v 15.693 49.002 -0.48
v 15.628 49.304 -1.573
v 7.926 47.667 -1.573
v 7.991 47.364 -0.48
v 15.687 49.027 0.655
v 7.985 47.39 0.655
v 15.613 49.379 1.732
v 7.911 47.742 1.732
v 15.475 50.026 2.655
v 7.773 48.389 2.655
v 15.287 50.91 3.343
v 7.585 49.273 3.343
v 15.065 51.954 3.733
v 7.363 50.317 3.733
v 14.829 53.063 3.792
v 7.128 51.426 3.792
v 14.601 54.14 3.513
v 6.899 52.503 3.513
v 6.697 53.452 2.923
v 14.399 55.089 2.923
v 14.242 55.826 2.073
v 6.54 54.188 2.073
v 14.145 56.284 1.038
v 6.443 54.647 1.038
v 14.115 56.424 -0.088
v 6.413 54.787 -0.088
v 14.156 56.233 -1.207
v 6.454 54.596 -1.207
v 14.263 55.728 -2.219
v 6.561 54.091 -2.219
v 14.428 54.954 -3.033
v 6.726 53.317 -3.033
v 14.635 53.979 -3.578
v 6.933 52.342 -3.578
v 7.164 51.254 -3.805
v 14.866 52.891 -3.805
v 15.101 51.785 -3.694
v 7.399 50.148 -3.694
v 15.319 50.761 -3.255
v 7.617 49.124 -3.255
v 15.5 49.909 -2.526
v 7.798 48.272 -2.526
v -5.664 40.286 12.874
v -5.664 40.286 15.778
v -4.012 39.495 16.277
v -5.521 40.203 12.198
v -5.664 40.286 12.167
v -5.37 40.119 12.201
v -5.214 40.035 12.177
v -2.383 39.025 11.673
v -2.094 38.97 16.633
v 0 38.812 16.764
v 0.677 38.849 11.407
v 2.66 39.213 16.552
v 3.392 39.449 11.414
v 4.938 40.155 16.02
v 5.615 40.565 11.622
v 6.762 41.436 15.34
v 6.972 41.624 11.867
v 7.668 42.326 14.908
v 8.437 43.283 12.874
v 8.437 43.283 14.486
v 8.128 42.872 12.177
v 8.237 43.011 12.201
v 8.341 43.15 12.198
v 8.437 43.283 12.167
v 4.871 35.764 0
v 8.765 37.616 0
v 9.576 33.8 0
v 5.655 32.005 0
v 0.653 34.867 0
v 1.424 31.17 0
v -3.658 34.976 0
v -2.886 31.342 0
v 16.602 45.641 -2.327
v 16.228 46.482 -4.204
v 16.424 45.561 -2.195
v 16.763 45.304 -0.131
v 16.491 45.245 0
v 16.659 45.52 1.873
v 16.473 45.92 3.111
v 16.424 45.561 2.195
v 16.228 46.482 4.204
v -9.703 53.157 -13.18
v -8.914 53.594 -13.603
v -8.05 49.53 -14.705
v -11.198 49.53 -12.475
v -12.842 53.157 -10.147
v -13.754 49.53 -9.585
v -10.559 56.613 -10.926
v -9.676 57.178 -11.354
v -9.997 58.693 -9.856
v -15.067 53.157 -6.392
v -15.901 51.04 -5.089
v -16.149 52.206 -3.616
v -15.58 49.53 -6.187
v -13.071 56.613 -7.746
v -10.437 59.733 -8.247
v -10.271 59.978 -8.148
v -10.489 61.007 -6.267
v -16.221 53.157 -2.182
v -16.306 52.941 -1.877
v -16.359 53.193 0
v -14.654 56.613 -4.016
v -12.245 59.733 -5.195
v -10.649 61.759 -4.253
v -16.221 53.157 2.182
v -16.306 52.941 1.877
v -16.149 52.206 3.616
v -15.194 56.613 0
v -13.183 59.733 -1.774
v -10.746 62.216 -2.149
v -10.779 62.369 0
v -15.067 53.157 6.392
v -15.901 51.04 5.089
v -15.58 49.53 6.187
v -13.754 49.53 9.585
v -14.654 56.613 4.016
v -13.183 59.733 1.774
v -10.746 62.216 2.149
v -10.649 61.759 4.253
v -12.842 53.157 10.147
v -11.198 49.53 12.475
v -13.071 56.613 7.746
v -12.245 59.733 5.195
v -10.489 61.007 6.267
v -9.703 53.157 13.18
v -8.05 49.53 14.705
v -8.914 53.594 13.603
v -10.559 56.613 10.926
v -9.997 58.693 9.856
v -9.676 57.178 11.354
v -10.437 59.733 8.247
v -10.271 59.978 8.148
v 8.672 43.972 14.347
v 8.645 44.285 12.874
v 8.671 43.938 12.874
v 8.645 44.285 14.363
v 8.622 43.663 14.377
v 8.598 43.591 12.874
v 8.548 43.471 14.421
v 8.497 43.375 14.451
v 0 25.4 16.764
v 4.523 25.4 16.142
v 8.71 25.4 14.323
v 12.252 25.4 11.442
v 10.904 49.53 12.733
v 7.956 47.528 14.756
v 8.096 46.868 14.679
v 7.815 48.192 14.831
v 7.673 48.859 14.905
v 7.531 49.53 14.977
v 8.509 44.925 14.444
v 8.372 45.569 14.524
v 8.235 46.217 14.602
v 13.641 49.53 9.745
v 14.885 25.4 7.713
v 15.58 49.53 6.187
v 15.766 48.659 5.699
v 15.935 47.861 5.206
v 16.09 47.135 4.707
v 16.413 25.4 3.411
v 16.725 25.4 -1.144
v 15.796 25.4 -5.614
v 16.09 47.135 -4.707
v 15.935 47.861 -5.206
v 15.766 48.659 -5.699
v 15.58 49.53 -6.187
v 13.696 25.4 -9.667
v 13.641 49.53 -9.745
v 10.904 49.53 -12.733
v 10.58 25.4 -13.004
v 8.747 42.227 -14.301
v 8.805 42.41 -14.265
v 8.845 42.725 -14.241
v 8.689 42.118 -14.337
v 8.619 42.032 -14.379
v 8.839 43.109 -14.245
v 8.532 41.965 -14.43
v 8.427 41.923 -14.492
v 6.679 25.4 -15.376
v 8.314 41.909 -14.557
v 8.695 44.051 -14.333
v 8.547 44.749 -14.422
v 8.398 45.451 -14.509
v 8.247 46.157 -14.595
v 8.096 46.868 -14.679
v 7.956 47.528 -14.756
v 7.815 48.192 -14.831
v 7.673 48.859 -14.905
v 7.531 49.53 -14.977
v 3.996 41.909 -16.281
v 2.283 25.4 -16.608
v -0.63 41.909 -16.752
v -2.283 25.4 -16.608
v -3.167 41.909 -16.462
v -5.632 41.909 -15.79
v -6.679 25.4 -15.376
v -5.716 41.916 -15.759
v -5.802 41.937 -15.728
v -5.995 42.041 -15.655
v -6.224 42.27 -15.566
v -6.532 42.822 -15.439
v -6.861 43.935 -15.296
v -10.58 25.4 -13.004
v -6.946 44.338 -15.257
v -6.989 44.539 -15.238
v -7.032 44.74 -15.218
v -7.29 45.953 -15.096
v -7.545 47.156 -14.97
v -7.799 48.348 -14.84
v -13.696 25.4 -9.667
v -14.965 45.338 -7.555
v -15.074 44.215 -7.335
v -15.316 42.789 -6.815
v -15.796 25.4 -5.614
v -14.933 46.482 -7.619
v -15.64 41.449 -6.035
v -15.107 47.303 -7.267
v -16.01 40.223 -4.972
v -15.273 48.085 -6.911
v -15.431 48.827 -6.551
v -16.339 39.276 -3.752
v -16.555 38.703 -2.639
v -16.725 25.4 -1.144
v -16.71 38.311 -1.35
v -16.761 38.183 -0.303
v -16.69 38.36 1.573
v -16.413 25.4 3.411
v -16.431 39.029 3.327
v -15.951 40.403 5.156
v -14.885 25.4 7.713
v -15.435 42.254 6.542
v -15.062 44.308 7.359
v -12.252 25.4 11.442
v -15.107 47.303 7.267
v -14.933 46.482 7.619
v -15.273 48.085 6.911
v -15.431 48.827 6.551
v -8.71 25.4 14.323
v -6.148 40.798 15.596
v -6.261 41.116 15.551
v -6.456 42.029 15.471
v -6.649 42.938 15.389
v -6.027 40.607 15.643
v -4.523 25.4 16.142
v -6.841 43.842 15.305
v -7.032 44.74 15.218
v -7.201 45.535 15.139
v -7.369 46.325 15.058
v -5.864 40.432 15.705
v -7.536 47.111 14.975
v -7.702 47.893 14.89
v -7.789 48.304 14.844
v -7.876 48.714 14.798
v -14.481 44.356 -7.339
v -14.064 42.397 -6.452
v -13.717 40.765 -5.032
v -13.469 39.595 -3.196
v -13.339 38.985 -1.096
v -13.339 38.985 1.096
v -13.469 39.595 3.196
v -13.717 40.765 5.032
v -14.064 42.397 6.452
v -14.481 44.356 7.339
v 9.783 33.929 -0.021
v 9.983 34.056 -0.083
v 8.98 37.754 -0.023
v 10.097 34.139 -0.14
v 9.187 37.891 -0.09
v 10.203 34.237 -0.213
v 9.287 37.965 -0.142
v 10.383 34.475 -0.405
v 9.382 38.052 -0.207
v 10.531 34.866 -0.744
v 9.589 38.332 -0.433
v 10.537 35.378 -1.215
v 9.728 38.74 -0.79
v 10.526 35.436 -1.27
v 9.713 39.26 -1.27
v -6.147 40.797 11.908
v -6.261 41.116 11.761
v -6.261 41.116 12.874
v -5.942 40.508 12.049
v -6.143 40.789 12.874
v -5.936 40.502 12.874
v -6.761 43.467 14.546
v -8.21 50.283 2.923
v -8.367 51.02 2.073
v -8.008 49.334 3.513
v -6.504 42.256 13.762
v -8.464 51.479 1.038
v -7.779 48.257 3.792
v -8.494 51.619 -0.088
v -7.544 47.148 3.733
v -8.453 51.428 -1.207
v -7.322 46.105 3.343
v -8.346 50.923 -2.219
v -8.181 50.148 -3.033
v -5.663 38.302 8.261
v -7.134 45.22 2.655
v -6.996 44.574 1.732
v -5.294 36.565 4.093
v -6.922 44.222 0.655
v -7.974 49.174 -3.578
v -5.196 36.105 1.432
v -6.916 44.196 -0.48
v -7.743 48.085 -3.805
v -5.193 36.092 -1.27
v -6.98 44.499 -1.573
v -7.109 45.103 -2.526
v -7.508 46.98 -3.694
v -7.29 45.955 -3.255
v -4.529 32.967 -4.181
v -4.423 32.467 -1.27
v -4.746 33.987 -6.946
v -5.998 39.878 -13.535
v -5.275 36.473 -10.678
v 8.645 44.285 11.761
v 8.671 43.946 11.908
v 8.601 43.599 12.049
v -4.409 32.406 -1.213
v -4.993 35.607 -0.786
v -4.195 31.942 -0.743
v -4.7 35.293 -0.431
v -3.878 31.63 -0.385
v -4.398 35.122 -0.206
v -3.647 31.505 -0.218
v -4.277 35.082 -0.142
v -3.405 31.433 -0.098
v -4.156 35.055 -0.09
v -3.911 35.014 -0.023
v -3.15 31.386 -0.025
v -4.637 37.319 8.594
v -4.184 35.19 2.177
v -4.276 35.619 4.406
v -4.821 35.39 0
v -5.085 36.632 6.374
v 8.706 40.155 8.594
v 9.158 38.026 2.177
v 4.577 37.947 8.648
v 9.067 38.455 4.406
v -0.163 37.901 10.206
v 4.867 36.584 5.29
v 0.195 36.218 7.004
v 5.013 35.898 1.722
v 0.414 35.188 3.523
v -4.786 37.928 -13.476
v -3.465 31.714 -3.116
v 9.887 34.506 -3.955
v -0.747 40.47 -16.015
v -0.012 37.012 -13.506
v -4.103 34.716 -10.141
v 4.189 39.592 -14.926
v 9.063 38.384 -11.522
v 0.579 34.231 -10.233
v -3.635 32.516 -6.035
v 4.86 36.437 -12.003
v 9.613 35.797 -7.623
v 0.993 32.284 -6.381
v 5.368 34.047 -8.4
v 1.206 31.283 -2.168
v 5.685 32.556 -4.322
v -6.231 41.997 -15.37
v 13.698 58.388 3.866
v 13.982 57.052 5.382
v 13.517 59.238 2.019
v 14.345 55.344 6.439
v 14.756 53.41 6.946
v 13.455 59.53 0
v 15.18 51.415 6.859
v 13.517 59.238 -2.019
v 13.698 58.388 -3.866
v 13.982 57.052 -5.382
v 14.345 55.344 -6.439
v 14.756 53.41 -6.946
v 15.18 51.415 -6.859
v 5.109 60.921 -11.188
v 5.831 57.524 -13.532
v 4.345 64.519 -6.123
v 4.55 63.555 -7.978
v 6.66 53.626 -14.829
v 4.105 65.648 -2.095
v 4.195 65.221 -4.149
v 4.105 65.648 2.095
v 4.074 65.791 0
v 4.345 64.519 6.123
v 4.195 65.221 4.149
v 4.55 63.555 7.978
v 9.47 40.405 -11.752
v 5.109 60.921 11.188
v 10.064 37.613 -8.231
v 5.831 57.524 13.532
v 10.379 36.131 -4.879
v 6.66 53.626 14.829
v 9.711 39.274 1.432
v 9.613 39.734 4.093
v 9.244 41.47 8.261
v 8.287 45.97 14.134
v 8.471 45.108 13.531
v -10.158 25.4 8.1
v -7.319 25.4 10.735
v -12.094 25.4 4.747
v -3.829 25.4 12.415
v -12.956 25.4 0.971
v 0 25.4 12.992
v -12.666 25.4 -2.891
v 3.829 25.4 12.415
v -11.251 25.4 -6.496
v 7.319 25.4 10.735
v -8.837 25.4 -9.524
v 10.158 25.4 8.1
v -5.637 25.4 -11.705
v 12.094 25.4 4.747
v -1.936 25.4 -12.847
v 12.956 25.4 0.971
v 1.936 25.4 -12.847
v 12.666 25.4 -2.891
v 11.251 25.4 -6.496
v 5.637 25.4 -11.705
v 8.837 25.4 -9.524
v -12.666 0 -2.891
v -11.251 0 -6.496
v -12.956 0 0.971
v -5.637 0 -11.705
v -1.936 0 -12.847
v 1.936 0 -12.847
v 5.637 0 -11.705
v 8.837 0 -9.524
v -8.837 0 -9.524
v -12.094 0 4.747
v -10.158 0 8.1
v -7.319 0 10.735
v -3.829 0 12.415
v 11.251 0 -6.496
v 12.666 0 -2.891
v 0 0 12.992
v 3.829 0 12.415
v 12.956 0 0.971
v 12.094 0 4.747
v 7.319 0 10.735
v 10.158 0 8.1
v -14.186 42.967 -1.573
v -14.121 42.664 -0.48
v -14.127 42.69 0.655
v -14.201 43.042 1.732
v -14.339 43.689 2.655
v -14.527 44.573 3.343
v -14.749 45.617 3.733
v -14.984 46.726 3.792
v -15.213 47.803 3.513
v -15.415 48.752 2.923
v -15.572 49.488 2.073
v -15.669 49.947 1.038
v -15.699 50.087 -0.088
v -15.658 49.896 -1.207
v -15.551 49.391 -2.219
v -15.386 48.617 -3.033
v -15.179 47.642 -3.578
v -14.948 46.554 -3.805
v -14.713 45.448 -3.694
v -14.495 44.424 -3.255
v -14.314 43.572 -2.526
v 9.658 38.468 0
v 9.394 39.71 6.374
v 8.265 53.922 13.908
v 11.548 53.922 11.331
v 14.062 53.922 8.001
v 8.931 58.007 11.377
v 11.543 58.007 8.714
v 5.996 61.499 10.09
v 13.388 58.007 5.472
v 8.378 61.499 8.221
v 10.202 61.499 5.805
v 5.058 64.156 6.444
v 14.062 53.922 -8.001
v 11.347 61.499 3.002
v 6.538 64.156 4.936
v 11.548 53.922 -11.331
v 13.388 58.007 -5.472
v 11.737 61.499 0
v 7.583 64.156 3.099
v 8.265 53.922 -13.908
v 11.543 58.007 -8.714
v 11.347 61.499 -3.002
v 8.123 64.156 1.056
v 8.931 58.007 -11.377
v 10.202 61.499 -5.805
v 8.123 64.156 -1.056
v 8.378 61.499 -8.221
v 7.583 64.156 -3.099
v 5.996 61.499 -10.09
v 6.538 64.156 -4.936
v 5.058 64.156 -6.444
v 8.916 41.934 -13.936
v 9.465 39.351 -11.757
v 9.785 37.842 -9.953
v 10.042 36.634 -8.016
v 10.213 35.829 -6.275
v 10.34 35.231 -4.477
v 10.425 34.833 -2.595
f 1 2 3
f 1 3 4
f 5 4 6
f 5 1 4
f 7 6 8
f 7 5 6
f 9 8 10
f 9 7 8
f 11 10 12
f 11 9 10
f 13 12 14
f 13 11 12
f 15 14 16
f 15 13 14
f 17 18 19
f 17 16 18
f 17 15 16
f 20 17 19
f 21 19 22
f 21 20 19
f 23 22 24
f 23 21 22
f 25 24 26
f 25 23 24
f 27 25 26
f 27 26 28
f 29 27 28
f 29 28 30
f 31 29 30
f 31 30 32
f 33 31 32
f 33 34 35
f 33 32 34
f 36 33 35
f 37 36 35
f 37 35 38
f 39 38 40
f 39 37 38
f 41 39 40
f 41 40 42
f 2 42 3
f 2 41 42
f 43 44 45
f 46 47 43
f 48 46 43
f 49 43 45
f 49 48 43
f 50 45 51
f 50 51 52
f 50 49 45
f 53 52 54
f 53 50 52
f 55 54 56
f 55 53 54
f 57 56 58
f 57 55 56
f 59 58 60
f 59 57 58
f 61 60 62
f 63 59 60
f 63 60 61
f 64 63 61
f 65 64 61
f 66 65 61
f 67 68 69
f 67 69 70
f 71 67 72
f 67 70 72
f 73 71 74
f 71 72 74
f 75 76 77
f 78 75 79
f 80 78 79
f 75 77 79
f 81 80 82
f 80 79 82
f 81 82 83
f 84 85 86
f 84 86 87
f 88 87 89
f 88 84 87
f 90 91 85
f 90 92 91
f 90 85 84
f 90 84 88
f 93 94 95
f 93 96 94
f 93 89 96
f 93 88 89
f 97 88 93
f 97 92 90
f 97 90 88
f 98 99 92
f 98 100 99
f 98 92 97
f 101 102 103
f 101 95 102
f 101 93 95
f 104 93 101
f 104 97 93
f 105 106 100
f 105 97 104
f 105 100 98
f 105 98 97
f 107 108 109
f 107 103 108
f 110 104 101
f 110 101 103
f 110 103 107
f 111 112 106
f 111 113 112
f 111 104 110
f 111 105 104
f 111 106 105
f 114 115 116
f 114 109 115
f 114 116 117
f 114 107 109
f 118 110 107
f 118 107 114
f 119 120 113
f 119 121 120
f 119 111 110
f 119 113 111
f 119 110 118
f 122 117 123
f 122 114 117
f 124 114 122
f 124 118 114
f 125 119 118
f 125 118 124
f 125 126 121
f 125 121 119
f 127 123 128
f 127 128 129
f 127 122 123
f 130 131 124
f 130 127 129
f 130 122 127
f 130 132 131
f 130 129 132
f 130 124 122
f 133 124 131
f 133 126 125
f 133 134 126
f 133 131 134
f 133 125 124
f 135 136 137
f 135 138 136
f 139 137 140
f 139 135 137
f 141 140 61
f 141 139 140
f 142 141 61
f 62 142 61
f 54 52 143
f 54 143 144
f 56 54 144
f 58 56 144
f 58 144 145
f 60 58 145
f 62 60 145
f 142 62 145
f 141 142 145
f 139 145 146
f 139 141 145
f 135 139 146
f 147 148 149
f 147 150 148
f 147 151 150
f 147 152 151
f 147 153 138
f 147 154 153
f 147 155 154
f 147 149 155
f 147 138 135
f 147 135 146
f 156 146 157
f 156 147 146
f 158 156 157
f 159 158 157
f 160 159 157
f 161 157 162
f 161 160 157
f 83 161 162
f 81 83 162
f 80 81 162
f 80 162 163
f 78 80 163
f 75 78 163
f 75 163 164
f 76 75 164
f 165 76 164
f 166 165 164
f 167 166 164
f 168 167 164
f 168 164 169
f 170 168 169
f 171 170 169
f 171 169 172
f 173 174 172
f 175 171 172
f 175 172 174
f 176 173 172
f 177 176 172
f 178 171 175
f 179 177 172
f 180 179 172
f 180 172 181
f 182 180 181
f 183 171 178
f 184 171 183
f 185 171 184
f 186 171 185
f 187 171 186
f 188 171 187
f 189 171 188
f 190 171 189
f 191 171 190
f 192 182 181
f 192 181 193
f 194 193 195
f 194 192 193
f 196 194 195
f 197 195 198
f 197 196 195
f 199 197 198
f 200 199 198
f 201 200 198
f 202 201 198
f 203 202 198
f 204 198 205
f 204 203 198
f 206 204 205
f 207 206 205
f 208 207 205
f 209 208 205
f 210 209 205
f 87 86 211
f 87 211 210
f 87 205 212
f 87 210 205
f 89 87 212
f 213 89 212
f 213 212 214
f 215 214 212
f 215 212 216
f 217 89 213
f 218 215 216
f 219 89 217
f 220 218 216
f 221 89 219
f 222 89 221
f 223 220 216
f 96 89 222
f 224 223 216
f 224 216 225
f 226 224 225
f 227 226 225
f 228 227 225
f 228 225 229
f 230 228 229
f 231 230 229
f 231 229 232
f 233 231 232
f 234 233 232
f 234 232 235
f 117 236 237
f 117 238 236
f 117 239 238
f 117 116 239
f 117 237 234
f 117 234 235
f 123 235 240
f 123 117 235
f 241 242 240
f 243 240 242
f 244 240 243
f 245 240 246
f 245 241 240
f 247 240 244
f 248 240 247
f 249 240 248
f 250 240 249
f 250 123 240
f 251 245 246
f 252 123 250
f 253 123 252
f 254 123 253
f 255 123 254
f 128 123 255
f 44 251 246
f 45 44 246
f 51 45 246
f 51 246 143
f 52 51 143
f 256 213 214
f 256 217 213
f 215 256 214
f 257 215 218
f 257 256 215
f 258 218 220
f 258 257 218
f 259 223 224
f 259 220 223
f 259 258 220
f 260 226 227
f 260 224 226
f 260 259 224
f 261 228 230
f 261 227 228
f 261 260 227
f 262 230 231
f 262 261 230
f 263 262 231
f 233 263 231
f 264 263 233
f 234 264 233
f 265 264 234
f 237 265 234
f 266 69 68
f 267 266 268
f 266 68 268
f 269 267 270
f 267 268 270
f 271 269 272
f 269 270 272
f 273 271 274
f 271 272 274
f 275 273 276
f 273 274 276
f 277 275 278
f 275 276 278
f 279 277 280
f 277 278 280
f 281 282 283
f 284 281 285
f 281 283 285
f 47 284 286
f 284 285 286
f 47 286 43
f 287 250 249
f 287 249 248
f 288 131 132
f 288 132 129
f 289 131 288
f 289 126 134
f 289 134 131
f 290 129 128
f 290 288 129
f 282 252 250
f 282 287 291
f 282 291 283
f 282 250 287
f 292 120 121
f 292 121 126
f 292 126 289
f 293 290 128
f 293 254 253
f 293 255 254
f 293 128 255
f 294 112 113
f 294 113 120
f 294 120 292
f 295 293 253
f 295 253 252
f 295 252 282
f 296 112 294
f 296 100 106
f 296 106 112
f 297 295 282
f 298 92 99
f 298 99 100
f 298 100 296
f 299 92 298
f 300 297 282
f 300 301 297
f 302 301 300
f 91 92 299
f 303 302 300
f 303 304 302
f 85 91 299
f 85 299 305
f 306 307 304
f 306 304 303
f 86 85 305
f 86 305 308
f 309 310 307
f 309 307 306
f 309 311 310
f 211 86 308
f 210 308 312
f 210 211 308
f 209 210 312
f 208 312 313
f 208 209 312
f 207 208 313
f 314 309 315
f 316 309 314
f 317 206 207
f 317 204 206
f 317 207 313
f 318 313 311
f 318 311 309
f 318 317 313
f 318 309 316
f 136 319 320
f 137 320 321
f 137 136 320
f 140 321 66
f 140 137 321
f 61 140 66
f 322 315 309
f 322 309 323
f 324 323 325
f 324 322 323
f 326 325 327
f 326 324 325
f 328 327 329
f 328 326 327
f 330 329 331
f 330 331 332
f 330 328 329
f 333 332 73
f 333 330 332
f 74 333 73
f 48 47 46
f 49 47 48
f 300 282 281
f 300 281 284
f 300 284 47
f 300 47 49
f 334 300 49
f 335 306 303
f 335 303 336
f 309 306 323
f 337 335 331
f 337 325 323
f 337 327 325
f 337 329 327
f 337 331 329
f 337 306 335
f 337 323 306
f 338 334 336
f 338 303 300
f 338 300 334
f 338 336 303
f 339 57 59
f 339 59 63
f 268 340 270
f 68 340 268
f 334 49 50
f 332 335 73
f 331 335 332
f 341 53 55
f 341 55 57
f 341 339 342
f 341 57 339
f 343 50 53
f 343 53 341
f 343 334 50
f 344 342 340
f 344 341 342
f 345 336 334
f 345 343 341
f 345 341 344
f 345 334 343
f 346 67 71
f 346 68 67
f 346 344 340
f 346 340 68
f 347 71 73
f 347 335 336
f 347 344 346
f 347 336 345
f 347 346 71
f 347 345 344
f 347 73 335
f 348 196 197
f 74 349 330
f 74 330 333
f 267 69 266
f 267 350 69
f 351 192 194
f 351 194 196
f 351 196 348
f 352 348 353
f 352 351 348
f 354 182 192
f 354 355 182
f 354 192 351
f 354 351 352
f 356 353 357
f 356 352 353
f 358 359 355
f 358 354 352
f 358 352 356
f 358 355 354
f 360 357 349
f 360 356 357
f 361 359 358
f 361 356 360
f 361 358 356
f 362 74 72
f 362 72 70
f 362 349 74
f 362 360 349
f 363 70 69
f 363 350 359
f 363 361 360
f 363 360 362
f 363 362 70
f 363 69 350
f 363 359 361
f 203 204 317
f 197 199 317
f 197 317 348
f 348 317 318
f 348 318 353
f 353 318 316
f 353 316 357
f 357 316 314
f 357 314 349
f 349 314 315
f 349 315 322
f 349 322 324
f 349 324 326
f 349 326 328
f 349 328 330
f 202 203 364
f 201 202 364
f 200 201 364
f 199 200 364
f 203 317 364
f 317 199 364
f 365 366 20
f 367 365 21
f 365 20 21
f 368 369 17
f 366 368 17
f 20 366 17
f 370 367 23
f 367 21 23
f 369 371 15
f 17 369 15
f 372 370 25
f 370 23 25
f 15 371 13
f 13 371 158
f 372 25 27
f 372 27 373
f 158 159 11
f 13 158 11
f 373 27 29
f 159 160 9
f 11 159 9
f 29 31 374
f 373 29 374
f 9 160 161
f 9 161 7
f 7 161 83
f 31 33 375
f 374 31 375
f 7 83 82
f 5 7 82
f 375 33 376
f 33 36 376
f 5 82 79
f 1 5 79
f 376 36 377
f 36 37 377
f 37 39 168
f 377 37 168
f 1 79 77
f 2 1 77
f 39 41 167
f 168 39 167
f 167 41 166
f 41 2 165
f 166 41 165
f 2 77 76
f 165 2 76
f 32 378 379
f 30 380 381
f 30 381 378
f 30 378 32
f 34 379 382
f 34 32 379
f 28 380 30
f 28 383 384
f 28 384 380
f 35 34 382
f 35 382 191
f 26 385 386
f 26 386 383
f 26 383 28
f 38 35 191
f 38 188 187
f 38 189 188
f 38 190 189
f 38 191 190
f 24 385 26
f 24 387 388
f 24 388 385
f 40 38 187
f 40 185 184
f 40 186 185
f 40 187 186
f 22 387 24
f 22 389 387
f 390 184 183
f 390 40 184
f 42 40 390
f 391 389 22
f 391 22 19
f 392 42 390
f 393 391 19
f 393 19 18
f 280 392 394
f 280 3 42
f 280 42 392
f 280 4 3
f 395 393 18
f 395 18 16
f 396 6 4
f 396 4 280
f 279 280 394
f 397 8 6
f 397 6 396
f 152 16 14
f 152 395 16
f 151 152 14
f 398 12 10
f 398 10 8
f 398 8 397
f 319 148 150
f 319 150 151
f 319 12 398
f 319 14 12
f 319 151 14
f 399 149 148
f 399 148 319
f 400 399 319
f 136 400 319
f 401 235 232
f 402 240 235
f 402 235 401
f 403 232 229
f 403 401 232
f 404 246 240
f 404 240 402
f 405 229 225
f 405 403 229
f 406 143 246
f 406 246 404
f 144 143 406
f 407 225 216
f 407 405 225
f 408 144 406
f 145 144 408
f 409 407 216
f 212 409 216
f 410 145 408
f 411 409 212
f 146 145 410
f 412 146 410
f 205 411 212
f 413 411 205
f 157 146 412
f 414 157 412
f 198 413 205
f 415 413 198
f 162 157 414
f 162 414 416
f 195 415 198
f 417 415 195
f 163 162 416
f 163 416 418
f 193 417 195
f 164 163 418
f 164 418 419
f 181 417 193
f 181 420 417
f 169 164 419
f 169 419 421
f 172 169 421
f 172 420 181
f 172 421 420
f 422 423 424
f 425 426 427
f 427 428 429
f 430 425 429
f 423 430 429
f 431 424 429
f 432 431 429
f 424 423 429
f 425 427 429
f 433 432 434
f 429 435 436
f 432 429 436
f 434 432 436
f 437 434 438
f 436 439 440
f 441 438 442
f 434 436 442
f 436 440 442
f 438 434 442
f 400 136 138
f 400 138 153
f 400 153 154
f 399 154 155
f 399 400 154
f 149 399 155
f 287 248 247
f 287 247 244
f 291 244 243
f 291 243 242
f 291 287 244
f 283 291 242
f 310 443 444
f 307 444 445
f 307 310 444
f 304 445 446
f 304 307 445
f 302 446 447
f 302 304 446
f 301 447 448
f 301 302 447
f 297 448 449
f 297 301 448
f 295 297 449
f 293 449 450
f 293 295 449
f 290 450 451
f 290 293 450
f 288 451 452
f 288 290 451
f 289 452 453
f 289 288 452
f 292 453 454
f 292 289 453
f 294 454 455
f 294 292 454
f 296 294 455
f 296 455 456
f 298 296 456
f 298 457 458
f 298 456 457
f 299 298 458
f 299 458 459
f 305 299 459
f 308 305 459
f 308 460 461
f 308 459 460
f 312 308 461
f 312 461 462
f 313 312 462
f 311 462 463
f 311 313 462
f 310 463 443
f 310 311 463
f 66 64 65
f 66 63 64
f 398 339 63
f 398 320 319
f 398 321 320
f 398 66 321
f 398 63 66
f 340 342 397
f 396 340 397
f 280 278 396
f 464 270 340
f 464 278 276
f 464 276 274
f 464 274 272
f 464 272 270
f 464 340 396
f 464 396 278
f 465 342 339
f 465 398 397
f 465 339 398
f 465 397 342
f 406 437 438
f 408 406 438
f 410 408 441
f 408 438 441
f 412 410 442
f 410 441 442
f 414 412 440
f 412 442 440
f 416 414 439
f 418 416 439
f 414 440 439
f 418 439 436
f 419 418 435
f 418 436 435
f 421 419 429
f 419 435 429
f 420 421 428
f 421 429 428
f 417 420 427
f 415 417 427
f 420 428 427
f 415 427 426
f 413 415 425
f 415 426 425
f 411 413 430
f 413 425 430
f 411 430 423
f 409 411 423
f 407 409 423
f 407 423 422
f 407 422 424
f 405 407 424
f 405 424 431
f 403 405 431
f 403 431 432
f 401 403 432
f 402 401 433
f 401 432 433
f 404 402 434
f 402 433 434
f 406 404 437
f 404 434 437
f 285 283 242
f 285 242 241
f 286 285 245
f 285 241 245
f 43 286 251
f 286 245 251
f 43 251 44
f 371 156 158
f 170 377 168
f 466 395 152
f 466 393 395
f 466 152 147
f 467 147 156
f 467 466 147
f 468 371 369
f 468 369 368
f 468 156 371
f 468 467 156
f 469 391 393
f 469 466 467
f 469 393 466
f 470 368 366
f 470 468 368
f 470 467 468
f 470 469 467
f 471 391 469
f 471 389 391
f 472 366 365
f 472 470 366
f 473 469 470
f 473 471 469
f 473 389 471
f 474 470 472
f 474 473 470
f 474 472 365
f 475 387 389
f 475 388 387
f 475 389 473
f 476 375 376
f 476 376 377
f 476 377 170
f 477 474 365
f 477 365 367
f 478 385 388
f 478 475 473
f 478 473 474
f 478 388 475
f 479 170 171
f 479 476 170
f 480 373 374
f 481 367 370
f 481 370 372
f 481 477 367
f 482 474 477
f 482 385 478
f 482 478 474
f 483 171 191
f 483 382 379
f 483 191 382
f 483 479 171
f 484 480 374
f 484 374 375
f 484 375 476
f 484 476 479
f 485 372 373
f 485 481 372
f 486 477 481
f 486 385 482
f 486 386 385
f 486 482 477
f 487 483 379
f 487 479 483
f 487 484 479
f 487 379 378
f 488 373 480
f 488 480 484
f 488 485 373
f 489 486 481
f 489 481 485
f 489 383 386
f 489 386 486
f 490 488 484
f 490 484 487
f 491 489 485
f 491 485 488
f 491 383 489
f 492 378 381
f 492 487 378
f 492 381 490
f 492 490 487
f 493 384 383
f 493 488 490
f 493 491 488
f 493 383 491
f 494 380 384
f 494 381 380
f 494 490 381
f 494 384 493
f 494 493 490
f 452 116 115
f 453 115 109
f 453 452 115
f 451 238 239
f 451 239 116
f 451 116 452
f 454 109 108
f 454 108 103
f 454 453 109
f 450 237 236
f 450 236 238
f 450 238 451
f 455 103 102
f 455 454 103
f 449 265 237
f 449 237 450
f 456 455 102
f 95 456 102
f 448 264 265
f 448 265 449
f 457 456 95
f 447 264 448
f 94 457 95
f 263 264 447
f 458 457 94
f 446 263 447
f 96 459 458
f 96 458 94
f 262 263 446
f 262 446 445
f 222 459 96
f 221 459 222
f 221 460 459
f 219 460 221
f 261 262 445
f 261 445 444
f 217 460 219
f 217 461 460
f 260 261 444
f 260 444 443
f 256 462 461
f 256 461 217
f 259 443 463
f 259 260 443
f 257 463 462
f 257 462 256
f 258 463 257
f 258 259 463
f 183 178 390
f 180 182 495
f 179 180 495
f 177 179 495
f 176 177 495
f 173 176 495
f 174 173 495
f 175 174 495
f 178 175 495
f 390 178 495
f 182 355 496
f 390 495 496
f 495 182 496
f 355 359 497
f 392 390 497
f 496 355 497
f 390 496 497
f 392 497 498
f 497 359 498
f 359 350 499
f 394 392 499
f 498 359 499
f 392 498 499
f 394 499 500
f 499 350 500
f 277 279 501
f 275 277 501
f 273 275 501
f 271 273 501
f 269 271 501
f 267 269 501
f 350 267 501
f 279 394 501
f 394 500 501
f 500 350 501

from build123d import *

# Parameters (mm, degrees)
SKETCH1_R                     = 12.9921
BOSS_EXTRUDE1_DEPTH           = 25.4
CUT_EXTRUDE1_DEPTH            = 104.344307451
CUT_EXTRUDE1_DEPTH_BACK       = 104.344307451
SKETCH3_R                     = 3.81
CUT_REVOLVE10_ANGLE           = 180
CUT_REVOLVE10_OTHER_WAY_ANGLE = 90
CUT_EXTRUDE4_DEPTH            = 32.004
FILLET1_R                     = 1.27
SKETCH15_R                    = 7.62
CUT_EXTRUDE5_DEPTH            = 10.16


with BuildPart() as part:
    # Sketch1 → Boss-Extrude1 (new body)
    with BuildSketch(Plane(origin=(0, 0, 0), x_dir=(1, 0, 0), z_dir=(0, 1, 0))):
        Circle(SKETCH1_R)
    extrude(amount=BOSS_EXTRUDE1_DEPTH)

    # Sketch2 → Revolve1 (revolve)
    with BuildSketch(Plane(origin=(0, 0, 0), x_dir=(0, 0, -1), z_dir=(1, 0, 0))):
        with BuildLine():
            Line((-16.764, 25.4), (-16.764, 49.53))
            ThreePointArc((-16.764, 49.53), (-11.85393808, 61.38393808), (0, 66.294))
            Line((0, 66.294), (0, 25.4))
            Line((0, 25.4), (-16.764, 25.4))
        make_face()
    revolve(axis=Axis((0, 25.4, 0), (0, 1, 0)))

    # Sketch3 → Cut-Extrude1 (cut, two sides: drawn at the far end of the back side and taken through both)
    with BuildSketch(Plane(origin=(-10.366451402, 98.300319395, 0), x_dir=(0, 0, -1), z_dir=(-0.9781476007338062, -0.20791169081775643, 0)).offset(-CUT_EXTRUDE1_DEPTH_BACK)):
        with Locations((0, 49.859877342)):
            Circle(SKETCH3_R)
    extrude(amount=CUT_EXTRUDE1_DEPTH + CUT_EXTRUDE1_DEPTH_BACK, mode=Mode.SUBTRACT)

    # Sketch11 → Cut-Revolve10 (revolve, cut)
    with BuildSketch(Plane.XY):
        with BuildLine():
            Line((-7.701934208, 47.892903347), (-11.162976054, 64.175825024))
            ThreePointArc((-11.162976054, 64.175825024), (-4.101170935, 67.482510185), (3.695979409, 67.570287171))
            Line((3.695979409, 67.570287171), (7.205035227, 51.061477515))
            Line((7.205035227, 51.061477515), (-7.701934208, 47.892903347))
        make_face()
    revolve(axis=Axis((17.487516564, 53.247086393, 0), (-0.9781476007338064, -0.2079116908177564, 0)), revolution_arc=CUT_REVOLVE10_ANGLE, mode=Mode.SUBTRACT)

    # Sketch11 → Cut-Revolve10 other way (revolve, cut)
    with BuildSketch(Plane.XY):
        with BuildLine():
            Line((-7.701934208, 47.892903347), (-11.162976054, 64.175825024))
            ThreePointArc((-11.162976054, 64.175825024), (-4.101170935, 67.482510185), (3.695979409, 67.570287171))
            Line((3.695979409, 67.570287171), (7.205035227, 51.061477515))
            Line((7.205035227, 51.061477515), (-7.701934208, 47.892903347))
        make_face()
    revolve(axis=Axis((17.487516564, 53.247086393, 0), (0.9781476007338064, 0.2079116908177564, 0)), revolution_arc=CUT_REVOLVE10_OTHER_WAY_ANGLE, mode=Mode.SUBTRACT)

    # Sketch13 → Cut-Revolve11 (revolve, cut)
    with BuildSketch(Plane.XY):
        with BuildLine():
            Line((-8.49407775, 51.619645705), (6.412891685, 54.788219873))
            Line((6.412891685, 54.788219873), (2.927360083, 71.186356794))
            ThreePointArc((2.927360083, 71.186356794), (-4.869286819, 71.216520857), (-11.979609352, 68.017782626))
            Line((-11.979609352, 68.017782626), (-8.49407775, 51.619645705))
        make_face()
    revolve(axis=Axis((-8.49407775, 51.619645705, 0), (0.9781476007338064, 0.20791169081775632, 0)), mode=Mode.SUBTRACT)

    # Sketch14 → Cut-Extrude4 (cut)
    with BuildSketch(Plane.XY):
        with BuildLine():
            Line((-7.701934208, 47.892903347), (-6.149656223, 40.590009601))
            ThreePointArc((-6.149656223, 40.590009601), (1.969552427, 39.042311826), (8.757313212, 43.758583769))
            Line((8.757313212, 43.758583769), (7.205035227, 51.061477515))
            Line((7.205035227, 51.061477515), (-7.701934208, 47.892903347))
        make_face()
    extrude(amount=CUT_EXTRUDE4_DEPTH, mode=Mode.SUBTRACT)

    # Fillet1
    fillet1_edges = [part.edges().sort_by_distance(p)[0] for p in [
        (-4.840027967, 34.428693074, -9.361457334),
        (-4.624719256, 33.415745227, 0),
        (-5.306564153, 36.623573262, 6.782727573),
        (-6.149656223, 40.590009601, 14.000445211),
        (8.757313212, 43.758583769, 13.350191985),
        (9.600405282, 39.79214743, 6.782727573),
        (10.306257166, 36.471375406, 0),
        (10.298585015, 36.507470038, -7.966497668),
    ]]
    fillet(fillet1_edges, radius=FILLET1_R)

    # Sketch15 → Cut-Extrude5 (cut)
    with BuildSketch(Plane(origin=(-4.834136469, -1.027527427, 0), x_dir=(0, 0, -1), z_dir=(-0.9781476007338062, -0.20791169081775643, 0))):
        with Locations((0, -48.447650664)):
            Circle(SKETCH15_R)
    cut_extrude5 = extrude(amount=CUT_EXTRUDE5_DEPTH, mode=Mode.SUBTRACT)

    # Mirror1: Cut-Extrude5 across plane
    add(cut_extrude5.mirror(Plane(origin=(10.072832966, 2.141046741, 0), x_dir=(0, 0, 1), z_dir=(-0.9781476007338062, -0.20791169081775643, 0))), mode=Mode.SUBTRACT)


solid = part.part
